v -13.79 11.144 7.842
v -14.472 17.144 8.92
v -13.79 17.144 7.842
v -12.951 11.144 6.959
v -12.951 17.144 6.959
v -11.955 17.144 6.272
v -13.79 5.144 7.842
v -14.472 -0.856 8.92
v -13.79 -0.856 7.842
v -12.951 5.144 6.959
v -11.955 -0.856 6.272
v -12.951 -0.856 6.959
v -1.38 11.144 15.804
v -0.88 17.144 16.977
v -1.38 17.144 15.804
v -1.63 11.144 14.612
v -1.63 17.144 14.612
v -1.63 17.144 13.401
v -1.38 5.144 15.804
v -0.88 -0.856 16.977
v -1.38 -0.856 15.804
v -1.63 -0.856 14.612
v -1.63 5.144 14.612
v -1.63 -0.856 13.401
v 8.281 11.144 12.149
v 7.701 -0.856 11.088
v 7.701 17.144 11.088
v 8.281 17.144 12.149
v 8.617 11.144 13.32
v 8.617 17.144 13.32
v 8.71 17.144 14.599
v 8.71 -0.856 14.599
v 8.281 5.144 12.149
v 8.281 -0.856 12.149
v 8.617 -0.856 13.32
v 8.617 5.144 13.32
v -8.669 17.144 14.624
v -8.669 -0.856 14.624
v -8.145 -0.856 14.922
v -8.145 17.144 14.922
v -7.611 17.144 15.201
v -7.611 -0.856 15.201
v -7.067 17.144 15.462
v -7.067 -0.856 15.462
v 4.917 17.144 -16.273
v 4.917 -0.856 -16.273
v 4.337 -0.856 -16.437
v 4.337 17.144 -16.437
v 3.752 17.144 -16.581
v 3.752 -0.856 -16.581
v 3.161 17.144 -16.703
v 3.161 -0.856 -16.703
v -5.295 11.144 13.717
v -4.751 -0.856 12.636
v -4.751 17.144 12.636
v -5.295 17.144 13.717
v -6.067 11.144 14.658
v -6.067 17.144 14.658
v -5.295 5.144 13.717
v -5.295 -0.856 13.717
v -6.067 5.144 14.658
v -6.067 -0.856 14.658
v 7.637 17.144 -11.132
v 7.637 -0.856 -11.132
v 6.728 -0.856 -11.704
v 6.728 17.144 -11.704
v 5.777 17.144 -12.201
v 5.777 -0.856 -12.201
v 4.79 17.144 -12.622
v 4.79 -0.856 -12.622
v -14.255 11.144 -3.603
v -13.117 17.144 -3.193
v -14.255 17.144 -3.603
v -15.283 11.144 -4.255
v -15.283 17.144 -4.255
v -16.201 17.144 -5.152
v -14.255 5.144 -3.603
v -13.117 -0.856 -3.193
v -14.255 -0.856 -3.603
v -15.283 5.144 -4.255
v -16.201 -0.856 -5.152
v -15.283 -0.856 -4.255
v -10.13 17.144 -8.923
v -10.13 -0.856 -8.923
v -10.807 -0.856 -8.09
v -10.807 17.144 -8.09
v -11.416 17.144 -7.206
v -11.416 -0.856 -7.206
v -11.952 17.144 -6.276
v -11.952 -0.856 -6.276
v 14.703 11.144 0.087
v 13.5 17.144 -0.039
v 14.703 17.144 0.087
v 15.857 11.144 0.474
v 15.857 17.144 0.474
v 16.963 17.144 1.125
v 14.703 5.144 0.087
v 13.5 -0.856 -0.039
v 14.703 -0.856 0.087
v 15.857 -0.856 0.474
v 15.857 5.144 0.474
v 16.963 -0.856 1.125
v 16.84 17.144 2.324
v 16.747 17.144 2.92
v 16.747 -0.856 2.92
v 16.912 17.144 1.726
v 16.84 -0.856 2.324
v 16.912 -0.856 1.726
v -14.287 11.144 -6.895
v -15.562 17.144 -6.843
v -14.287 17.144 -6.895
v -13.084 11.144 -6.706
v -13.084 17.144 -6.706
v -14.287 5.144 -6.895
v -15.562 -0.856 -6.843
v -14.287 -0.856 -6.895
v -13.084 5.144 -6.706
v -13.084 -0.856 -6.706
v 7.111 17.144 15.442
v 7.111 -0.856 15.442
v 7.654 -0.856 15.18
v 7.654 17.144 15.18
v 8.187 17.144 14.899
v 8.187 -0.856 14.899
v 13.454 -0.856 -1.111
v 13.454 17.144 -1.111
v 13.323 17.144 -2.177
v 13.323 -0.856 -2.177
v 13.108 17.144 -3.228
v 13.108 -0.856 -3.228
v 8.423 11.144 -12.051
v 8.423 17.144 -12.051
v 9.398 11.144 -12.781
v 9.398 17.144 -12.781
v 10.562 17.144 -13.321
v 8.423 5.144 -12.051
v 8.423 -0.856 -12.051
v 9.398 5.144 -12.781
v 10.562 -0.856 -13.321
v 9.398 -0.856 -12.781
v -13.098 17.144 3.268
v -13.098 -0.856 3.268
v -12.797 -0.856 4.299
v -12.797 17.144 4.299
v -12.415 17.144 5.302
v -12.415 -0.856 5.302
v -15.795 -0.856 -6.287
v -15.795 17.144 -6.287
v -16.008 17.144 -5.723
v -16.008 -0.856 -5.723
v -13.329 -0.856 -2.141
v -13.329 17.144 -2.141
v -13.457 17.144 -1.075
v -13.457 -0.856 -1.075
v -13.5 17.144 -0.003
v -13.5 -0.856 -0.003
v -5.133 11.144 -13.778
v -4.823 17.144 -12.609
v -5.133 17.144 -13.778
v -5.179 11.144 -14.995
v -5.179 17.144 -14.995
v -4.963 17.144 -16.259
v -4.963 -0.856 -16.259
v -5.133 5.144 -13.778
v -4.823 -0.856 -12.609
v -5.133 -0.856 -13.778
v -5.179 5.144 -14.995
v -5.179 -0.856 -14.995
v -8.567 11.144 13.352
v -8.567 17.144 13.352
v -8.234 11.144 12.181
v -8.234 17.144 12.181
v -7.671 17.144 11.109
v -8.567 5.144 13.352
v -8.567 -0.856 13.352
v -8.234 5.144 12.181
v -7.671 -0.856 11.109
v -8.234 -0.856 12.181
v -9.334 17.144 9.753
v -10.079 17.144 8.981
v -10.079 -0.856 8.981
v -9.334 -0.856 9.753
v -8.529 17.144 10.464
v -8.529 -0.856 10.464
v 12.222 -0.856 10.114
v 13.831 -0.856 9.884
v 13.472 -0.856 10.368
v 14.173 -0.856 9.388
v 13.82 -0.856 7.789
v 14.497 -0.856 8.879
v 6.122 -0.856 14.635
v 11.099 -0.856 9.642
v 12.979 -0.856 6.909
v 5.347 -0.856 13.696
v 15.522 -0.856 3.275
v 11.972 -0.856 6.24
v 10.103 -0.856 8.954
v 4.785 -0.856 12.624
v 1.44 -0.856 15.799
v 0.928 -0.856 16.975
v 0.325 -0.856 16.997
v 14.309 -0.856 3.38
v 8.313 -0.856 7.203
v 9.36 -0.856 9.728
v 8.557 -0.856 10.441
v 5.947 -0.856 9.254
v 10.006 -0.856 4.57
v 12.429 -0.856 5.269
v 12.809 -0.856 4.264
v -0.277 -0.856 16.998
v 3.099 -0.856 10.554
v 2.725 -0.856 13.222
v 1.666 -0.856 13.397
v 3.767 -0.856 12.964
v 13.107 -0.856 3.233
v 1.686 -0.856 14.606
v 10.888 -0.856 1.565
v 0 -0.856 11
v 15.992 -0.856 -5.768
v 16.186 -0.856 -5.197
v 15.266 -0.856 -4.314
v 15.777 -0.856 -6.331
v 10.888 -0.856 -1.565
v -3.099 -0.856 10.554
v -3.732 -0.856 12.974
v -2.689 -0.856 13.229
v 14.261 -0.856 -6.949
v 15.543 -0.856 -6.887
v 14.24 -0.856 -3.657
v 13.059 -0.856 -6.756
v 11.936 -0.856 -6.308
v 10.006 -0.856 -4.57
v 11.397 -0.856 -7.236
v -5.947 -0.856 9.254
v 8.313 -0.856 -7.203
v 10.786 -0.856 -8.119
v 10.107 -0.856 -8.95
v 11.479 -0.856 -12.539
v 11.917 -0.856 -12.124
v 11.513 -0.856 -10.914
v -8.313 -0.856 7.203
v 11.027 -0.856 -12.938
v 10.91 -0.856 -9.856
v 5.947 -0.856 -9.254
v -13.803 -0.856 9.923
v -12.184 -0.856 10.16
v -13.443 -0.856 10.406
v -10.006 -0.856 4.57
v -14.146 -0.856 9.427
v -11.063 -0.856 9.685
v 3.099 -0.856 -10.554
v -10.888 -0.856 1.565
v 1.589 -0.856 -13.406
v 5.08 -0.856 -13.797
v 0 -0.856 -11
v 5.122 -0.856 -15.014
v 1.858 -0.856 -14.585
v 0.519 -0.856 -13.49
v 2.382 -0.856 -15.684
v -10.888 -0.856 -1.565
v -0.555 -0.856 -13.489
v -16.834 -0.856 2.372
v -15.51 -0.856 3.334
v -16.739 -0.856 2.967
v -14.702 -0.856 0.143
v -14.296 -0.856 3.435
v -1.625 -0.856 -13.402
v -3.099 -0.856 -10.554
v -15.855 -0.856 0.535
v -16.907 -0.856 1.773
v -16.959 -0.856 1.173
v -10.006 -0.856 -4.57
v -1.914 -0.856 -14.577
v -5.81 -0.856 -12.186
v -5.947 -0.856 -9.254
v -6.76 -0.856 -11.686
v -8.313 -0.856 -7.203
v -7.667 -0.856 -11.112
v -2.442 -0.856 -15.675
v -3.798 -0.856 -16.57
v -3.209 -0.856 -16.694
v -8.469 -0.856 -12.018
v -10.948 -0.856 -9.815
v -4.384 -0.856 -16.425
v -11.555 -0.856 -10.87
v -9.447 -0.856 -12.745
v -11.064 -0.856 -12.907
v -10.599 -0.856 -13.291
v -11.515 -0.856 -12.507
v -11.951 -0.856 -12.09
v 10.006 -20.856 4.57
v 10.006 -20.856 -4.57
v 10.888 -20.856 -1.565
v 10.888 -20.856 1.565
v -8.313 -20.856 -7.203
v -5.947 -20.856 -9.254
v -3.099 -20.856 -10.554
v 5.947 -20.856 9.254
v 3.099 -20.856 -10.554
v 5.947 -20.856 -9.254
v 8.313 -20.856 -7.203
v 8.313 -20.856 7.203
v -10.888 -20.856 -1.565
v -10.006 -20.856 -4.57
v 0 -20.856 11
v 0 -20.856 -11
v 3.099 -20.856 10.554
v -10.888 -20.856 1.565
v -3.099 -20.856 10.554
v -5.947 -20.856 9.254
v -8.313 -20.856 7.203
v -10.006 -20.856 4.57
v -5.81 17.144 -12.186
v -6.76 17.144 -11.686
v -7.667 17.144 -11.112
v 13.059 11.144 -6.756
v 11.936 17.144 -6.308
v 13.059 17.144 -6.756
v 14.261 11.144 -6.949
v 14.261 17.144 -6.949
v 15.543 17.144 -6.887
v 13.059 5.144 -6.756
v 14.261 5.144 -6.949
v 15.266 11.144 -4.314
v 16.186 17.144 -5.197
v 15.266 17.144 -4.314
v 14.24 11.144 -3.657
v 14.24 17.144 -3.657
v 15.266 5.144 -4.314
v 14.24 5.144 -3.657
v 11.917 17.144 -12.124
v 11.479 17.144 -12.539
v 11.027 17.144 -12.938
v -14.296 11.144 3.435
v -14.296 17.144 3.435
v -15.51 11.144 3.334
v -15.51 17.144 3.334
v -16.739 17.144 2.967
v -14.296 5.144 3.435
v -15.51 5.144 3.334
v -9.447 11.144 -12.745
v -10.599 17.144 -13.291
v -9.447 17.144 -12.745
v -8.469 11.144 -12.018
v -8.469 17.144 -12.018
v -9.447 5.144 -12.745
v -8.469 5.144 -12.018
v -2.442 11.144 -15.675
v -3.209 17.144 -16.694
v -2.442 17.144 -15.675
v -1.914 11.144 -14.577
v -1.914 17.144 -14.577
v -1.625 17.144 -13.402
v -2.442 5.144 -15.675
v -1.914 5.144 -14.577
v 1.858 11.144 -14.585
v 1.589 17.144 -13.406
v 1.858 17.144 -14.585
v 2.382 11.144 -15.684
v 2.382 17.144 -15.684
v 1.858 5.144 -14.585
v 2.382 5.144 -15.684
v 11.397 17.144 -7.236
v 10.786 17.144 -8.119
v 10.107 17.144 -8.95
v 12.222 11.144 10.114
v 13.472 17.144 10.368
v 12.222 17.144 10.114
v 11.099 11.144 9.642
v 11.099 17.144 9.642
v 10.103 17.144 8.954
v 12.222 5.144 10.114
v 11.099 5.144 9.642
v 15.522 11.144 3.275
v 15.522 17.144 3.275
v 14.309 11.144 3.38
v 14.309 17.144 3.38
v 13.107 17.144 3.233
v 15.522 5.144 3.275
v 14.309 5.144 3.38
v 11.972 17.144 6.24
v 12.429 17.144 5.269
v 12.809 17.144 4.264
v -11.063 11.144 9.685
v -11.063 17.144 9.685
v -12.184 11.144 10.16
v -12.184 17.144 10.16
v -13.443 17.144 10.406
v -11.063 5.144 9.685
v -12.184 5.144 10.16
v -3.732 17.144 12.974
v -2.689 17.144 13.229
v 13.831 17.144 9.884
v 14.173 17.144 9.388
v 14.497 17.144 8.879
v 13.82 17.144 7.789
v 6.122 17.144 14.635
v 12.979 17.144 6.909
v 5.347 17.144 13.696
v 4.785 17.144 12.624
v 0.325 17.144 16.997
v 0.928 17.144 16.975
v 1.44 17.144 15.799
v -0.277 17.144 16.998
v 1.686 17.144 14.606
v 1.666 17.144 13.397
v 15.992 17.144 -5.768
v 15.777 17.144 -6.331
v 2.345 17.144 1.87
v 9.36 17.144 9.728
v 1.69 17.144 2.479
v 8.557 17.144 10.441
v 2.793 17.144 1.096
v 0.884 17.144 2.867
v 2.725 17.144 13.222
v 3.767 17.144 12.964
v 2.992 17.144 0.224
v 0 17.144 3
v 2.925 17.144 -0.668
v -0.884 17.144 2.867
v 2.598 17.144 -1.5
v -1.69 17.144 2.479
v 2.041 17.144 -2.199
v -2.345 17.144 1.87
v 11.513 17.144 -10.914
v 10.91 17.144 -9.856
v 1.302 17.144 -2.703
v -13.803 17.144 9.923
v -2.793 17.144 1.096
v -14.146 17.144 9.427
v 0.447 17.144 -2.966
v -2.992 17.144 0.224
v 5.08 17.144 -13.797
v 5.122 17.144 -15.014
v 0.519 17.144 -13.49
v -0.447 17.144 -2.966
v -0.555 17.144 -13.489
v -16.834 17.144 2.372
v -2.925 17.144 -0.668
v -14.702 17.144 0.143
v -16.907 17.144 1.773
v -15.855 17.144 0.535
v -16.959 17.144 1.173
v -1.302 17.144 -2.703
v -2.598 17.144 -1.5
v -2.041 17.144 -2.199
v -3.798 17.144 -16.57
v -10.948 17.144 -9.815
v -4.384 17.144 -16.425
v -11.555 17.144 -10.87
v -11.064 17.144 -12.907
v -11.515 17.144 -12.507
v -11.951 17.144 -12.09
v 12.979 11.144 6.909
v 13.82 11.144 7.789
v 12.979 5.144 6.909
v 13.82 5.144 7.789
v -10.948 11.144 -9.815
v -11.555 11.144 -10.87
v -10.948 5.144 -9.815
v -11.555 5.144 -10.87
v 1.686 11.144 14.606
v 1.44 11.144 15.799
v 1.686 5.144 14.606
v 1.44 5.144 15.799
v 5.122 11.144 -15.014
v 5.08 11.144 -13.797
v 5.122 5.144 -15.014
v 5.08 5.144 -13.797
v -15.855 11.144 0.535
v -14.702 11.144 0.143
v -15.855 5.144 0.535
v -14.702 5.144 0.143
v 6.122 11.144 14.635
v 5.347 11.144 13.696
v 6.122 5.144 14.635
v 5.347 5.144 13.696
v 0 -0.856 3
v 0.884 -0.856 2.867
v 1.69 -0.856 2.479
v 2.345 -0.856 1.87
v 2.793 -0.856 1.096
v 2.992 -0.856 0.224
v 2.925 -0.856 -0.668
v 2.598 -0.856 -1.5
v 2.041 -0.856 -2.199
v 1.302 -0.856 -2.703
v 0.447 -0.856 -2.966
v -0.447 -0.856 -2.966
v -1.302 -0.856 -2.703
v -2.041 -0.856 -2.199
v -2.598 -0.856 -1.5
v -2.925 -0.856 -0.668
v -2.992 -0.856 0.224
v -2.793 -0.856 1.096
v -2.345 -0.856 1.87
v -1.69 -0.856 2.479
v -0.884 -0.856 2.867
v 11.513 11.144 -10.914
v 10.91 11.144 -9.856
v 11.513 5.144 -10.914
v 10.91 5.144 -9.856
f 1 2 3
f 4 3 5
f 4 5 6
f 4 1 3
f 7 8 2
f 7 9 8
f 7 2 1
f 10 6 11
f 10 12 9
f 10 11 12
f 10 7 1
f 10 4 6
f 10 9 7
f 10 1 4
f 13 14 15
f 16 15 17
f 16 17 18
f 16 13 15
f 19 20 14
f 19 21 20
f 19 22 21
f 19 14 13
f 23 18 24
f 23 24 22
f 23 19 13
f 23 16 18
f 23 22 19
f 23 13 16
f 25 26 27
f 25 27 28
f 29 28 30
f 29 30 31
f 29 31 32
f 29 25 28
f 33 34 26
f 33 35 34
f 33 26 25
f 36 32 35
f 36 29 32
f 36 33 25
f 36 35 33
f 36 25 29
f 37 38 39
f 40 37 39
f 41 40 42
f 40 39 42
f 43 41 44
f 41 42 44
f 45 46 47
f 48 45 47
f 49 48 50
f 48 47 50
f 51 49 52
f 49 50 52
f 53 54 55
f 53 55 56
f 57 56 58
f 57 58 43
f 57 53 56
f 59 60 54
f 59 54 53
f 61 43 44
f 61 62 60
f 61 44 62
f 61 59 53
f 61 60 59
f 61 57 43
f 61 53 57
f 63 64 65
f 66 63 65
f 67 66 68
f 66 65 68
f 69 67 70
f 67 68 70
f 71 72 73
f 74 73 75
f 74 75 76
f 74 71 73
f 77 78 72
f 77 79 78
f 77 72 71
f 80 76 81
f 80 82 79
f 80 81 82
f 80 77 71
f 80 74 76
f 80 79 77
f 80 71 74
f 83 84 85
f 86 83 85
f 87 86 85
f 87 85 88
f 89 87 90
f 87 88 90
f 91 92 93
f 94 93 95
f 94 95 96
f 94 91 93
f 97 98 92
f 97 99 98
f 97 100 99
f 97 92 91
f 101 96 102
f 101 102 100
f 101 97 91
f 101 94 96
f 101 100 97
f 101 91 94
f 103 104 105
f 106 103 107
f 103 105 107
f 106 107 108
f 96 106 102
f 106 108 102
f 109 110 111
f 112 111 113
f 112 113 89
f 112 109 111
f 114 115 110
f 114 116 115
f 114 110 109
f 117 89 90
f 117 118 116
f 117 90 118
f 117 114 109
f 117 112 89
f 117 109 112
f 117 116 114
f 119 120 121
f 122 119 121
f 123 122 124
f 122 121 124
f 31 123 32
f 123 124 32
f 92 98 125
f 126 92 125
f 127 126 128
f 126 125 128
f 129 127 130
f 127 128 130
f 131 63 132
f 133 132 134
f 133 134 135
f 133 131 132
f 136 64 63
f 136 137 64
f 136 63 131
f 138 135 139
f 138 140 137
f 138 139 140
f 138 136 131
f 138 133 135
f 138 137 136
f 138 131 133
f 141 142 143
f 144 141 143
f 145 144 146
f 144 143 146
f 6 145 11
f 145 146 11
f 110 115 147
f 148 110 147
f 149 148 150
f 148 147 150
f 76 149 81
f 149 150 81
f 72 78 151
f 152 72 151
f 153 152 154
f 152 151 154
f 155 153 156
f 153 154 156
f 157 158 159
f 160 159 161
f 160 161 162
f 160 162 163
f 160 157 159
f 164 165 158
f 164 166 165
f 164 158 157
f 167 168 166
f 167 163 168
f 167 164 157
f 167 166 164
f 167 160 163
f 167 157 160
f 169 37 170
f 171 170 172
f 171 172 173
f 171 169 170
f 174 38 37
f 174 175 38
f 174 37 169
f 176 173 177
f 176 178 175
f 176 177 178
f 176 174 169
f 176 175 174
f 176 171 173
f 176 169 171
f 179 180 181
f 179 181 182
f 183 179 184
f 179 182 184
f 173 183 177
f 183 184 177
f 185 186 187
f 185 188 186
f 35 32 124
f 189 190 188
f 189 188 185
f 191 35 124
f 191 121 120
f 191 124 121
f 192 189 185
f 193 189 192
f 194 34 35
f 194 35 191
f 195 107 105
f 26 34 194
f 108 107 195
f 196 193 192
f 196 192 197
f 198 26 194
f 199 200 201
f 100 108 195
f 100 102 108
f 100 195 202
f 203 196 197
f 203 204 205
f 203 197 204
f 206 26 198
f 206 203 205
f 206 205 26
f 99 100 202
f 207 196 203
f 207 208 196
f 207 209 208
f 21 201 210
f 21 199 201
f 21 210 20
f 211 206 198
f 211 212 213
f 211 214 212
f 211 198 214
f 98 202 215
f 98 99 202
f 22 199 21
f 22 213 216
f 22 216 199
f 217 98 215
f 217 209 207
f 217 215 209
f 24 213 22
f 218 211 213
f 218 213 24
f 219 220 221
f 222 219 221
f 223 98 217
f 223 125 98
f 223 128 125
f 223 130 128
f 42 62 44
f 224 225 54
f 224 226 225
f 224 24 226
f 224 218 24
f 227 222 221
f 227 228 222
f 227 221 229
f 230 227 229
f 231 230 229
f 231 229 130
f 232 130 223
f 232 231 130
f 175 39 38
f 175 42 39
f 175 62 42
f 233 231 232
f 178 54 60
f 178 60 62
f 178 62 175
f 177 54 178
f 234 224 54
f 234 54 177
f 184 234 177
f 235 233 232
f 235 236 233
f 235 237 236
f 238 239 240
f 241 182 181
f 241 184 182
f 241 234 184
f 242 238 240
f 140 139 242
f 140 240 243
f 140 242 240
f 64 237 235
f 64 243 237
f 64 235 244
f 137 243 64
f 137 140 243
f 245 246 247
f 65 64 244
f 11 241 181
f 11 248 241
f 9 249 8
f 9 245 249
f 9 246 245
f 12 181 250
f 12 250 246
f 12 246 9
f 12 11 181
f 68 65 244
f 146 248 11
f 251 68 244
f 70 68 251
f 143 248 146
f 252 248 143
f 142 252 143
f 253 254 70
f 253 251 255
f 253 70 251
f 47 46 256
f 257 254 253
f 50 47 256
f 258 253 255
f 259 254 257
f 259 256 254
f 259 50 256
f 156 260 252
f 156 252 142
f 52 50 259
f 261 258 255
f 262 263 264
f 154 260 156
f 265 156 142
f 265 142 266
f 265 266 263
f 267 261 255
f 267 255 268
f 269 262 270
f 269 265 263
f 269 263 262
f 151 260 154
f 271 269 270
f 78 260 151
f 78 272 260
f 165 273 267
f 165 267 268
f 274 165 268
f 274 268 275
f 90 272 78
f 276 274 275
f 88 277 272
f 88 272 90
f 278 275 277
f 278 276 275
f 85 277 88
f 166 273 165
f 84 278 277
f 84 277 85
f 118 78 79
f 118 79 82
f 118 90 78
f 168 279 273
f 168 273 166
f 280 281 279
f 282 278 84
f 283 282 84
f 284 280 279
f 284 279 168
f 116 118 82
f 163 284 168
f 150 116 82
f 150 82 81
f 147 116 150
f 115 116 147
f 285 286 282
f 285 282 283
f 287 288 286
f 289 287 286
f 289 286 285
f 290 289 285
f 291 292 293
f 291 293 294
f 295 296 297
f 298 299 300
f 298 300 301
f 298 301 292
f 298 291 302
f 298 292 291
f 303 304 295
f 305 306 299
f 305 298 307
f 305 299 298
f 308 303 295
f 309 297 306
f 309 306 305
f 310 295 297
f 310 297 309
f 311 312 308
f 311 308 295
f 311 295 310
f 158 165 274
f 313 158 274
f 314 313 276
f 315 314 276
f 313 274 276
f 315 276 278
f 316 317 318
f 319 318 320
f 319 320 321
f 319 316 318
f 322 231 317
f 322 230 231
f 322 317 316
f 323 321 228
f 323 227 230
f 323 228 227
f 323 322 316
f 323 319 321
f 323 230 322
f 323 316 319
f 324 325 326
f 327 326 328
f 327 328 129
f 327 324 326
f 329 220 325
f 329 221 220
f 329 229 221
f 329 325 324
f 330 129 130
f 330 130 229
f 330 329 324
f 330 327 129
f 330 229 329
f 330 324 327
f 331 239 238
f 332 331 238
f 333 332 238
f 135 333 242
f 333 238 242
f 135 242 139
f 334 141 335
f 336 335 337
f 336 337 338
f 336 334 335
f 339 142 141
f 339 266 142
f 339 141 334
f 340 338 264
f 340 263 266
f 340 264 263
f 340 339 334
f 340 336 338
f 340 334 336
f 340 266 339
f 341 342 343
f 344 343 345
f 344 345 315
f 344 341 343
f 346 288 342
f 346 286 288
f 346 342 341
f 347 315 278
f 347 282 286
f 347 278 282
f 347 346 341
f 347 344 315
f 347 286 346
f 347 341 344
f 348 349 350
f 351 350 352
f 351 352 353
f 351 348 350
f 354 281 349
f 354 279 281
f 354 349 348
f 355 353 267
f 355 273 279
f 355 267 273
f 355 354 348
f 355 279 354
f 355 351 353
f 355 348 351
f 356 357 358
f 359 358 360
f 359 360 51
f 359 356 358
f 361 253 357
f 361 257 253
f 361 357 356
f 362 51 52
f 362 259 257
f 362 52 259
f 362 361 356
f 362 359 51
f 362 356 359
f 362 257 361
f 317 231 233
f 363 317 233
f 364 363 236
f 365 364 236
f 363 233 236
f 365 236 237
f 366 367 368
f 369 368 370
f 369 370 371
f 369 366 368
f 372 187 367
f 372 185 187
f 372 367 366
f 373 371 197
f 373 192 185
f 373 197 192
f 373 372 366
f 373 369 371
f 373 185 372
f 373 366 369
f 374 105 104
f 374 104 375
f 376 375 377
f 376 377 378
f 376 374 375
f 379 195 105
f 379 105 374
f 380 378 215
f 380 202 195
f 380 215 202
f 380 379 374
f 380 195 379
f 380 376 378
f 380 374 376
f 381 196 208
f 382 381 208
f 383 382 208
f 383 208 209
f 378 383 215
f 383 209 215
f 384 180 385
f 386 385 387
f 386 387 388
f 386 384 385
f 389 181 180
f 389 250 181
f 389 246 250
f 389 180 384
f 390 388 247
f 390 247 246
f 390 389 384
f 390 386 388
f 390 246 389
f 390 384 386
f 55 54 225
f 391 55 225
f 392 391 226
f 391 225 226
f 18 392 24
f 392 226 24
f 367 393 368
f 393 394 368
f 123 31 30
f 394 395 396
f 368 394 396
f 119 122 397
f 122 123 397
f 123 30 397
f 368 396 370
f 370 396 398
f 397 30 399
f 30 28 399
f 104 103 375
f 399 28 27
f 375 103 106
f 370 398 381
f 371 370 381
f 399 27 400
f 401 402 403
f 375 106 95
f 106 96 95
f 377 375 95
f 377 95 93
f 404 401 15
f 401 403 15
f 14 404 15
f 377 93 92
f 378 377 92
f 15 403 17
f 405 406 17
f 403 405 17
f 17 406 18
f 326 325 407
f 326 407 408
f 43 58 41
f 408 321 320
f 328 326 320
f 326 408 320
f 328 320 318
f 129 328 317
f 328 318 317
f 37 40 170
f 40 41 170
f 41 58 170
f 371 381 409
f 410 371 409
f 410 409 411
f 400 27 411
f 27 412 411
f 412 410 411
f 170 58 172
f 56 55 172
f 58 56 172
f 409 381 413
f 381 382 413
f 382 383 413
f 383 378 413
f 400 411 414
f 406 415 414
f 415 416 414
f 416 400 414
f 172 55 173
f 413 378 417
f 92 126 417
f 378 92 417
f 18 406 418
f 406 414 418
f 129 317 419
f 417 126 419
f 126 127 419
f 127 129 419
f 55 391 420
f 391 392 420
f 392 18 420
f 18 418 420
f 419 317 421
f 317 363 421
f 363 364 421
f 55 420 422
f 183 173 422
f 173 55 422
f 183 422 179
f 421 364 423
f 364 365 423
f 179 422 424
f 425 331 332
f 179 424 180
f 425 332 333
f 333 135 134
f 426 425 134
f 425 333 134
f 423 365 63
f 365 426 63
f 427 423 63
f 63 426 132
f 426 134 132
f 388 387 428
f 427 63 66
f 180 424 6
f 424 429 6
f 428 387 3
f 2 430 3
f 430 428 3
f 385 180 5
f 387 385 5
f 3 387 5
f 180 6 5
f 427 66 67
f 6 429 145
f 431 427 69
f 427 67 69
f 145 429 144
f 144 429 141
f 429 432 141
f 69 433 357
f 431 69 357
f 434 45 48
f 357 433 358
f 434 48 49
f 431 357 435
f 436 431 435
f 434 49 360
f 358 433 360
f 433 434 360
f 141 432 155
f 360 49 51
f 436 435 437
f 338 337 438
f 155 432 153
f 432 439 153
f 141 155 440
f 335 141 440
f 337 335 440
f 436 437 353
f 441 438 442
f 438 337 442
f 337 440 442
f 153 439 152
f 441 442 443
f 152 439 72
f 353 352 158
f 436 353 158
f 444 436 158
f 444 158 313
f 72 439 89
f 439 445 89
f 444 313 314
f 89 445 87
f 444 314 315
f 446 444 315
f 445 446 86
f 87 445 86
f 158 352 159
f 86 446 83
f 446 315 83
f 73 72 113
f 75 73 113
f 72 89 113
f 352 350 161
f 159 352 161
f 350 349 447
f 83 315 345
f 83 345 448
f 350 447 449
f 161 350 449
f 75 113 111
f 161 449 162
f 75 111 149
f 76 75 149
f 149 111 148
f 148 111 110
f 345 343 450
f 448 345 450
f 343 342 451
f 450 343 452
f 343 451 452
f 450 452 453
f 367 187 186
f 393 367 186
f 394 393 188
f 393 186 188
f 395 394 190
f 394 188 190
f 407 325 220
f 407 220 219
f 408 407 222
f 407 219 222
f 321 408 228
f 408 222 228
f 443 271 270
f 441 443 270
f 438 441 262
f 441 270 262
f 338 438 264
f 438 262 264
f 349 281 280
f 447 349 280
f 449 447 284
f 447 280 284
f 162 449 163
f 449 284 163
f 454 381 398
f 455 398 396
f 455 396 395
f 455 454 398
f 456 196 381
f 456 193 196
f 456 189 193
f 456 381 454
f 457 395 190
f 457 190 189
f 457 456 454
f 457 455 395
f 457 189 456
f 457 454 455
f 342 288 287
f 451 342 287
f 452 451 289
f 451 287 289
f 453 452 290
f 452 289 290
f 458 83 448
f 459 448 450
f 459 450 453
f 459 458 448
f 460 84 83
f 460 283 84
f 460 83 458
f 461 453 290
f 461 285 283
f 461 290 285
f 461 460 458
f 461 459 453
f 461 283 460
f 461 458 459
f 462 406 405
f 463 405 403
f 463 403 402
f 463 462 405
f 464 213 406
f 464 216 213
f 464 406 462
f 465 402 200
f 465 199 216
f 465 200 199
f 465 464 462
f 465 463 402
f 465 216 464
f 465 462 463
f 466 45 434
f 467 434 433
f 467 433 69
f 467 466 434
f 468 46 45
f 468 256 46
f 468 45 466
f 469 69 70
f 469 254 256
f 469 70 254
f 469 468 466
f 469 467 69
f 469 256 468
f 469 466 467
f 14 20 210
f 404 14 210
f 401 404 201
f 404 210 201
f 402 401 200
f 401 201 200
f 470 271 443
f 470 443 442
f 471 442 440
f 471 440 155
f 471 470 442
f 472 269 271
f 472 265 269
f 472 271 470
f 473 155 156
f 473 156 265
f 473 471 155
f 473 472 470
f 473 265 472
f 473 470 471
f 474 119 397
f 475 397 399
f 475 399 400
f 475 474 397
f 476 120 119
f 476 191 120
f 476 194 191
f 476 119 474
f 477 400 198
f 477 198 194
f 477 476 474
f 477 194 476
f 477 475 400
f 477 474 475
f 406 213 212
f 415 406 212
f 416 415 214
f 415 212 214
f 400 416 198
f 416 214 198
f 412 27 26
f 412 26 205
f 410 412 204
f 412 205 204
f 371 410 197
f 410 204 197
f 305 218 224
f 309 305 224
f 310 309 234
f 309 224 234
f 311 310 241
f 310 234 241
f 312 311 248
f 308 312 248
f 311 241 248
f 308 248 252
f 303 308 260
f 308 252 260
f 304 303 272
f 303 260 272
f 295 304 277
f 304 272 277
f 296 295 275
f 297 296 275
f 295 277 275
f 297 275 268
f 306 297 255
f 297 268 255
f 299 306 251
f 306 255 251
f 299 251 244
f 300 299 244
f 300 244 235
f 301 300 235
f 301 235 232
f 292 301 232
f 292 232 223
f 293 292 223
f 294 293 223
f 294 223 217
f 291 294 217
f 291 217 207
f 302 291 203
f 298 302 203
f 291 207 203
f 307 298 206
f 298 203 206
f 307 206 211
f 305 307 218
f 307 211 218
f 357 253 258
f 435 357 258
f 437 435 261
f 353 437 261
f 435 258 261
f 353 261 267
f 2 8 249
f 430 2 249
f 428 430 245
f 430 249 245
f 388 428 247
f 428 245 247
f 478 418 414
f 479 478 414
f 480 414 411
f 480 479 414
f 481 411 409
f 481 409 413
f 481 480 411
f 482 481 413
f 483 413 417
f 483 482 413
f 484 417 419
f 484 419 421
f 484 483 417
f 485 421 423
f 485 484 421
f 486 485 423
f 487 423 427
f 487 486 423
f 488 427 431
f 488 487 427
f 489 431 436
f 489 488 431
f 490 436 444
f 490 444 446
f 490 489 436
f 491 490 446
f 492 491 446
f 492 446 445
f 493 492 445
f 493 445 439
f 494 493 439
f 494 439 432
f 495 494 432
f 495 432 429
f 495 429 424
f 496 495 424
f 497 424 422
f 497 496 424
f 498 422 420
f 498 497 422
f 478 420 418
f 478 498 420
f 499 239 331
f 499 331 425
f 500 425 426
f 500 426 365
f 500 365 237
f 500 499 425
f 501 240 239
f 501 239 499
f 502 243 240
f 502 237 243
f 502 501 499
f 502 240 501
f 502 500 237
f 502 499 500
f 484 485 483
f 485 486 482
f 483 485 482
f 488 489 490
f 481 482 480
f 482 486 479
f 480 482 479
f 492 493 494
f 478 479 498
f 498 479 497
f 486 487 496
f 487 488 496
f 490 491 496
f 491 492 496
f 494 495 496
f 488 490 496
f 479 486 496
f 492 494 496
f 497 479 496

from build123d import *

# Parameters (mm, degrees)
SKETCH1_R           = 1.5
BOSS_EXTRUDE1_DEPTH = 9
SKETCH2_R           = 5.5
BOSS_EXTRUDE2_DEPTH = 10
L_EK2_SCALE         = 2


with BuildPart() as part:
    # Sketch1 → Boss-Extrude1 (new body)
    with BuildSketch(Plane(origin=(0, 0, 0), x_dir=(1, 0, 0), z_dir=(0, 1, 0))):
        with BuildLine():
            add(Edge.make_bspline(
                [(-5.065227978, 4.461610195), (-5.526615005, 4.86619147), (-5.830003112, 5.39406146), (-5.975392301, 6.045220165)],
                knots=[0, 0, 0, 0, 0.872429449, 0.872429449, 0.872429449, 0.872429449], degree=3))
            ThreePointArc((-5.065227978, 4.461610195), (-5.560258819, 3.827012132), (-5.976238464, 3.138004752))
            add(Edge.make_bspline(
                [(-7.780961116, 3.42149735), (-7.125870497, 3.507536778), (-6.52429628, 3.413039245), (-5.976238464, 3.138004752)],
                knots=[0.127683247, 0.127683247, 0.127683247, 0.127683247, 1, 1, 1, 1], degree=3))
            ThreePointArc((-7.780961116, 3.42149735), (-7.951879756, 3.00293329), (-8.10030101, 2.575873357))
            add(Edge.make_bspline(
                [(-6.558450277, 1.596630818), (-7.155006493, 1.740452504), (-7.668956737, 2.066866683), (-8.10030101, 2.575873357)],
                knots=[0, 0, 0, 0, 0.872429449, 0.872429449, 0.872429449, 0.872429449], degree=3))
            ThreePointArc((-6.558450277, 1.596630818), (-6.701865893, 0.804669837), (-6.749999881, 0.00126872))
            add(Edge.make_bspline(
                [(-8.479748007, -0.586407486), (-7.939678588, -0.205787566), (-7.363095879, -0.009895497), (-6.749999881, 0.00126872)],
                knots=[0.127683247, 0.127683247, 0.127683247, 0.127683247, 1, 1, 1, 1], degree=3))
            ThreePointArc((-8.479748007, -0.586407486), (-8.436572529, -1.036457408), (-8.369528376, -1.483574994))
            add(Edge.make_bspline(
                [(-6.549210655, -1.634117437), (-7.144272221, -1.784003157), (-7.751044795, -1.733822342), (-8.369528376, -1.483574994)],
                knots=[0, 0, 0, 0, 0.872429449, 0.872429449, 0.872429449, 0.872429449], degree=3))
            ThreePointArc((-6.549210655, -1.634117437), (-6.308156258, -2.402012621), (-5.977417671, -3.13575796))
            add(Edge.make_bspline(
                [(-7.235926822, -4.459973434), (-6.934601997, -3.871968458), (-6.515098947, -3.4305633), (-5.977417671, -3.13575796)],
                knots=[0.127683247, 0.127683247, 0.127683247, 0.127683247, 1, 1, 1, 1], degree=3))
            ThreePointArc((-7.235926822, -4.459973434), (-6.988548208, -4.838408204), (-6.721397655, -5.203154193))
            add(Edge.make_bspline(
                [(-5.039625799, -4.490509081), (-5.496871281, -4.899765193), (-6.0574619, -5.137313564), (-6.721397655, -5.203154193)],
                knots=[0, 0, 0, 0, 0.872429449, 0.872429449, 0.872429449, 0.872429449], degree=3))
            ThreePointArc((-5.039625799, -4.490509081), (-4.469324045, -5.058422935), (-3.835481109, -5.554420281))
            add(Edge.make_bspline(
                [(-4.334442004, -7.311813216), (-4.34089166, -6.651128039), (-4.174571361, -6.065330394), (-3.835481109, -5.554420281)],
                knots=[0.127683247, 0.127683247, 0.127683247, 0.127683247, 1, 1, 1, 1], degree=3))
            ThreePointArc((-4.334442004, -7.311813216), (-3.939531713, -7.53193799), (-3.533475733, -7.730753472))
            add(Edge.make_bspline(
                [(-2.375523406, -6.318179211), (-2.590203375, -6.893050073), (-2.976187484, -7.36390816), (-3.533475733, -7.730753472)],
                knots=[0, 0, 0, 0, 0.872429449, 0.872429449, 0.872429449, 0.872429449], degree=3))
            ThreePointArc((-2.375523406, -6.318179211), (-1.606623554, -6.556009515), (-0.814882047, -6.700631854))
            add(Edge.make_bspline(
                [(-0.439988759, -8.488604708), (-0.752735357, -7.906594341), (-0.877699786, -7.31060339), (-0.814882047, -6.700631854)],
                knots=[0.127683247, 0.127683247, 0.127683247, 0.127683247, 1, 1, 1, 1], degree=3))
            ThreePointArc((-0.439988759, -8.488604708), (0.011984021, -8.499991552), (0.463922896, -8.487330296))
            add(Edge.make_bspline(
                [(0.832782771, -6.698430626), (0.909848909, -7.307220251), (0.786895617, -7.903520141), (0.463922896, -8.487330296)],
                knots=[0, 0, 0, 0, 0.872429449, 0.872429449, 0.872429449, 0.872429449], degree=3))
            ThreePointArc((0.832782771, -6.698430626), (1.624135031, -6.551693323), (2.392396671, -6.311809421))
            add(Edge.make_bspline(
                [(3.555260608, -7.72075916), (3.007863545, -7.350755165), (2.620242233, -6.881105252), (2.392396671, -6.311809421)],
                knots=[0.127683247, 0.127683247, 0.127683247, 0.127683247, 1, 1, 1, 1], degree=3))
            ThreePointArc((3.555260608, -7.72075916), (3.96075436, -7.520799485), (4.355042381, -7.299562032))
            add(Edge.make_bspline(
                [(3.850308451, -5.54415231), (4.201465773, -6.047394331), (4.369710416, -6.632530905), (4.355042381, -7.299562032)],
                knots=[0, 0, 0, 0, 0.872429449, 0.872429449, 0.872429449, 0.872429449], degree=3))
            ThreePointArc((3.850308451, -5.54415231), (4.482823853, -5.046463148), (5.051606144, -4.477027515))
            add(Edge.make_bspline(
                [(6.736042616, -5.184180734), (6.079397157, -5.110946566), (5.517918333, -4.875228826), (5.051606144, -4.477027515)],
                knots=[0.127683247, 0.127683247, 0.127683247, 0.127683247, 1, 1, 1, 1], degree=3))
            ThreePointArc((6.736042616, -5.184180734), (7.002163607, -4.818682892), (7.24847414, -4.439552076))
            add(Edge.make_bspline(
                [(5.985774866, -3.119775513), (6.530577461, -3.402183249), (6.951477219, -3.84210877), (7.24847414, -4.439552076)],
                knots=[0, 0, 0, 0, 0.872429449, 0.872429449, 0.872429449, 0.872429449], degree=3))
            ThreePointArc((5.985774866, -3.119775513), (6.314551754, -2.385149082), (6.553553527, -1.616612559))
            add(Edge.make_bspline(
                [(8.373678438, -1.459968977), (7.758214146, -1.700281702), (7.151505842, -1.75249623), (6.553553527, -1.616612559)],
                knots=[0.127683247, 0.127683247, 0.127683247, 0.127683247, 1, 1, 1, 1], degree=3))
            ThreePointArc((8.373678438, -1.459968977), (8.439461558, -1.01266412), (8.481367828, -0.562494242))
            add(Edge.make_bspline(
                [(6.749972396, 0.019304256), (7.363612555, 0.022427015), (7.940744366, -0.171505818), (8.481367828, -0.562494242)],
                knots=[0, 0, 0, 0, 0.872429449, 0.872429449, 0.872429449, 0.872429449], degree=3))
            ThreePointArc((6.749972396, 0.019304256), (6.699691947, 0.822573894), (6.554160776, 1.614148852))
            add(Edge.make_bspline(
                [(8.093005444, 2.598704077), (7.65971777, 2.099897208), (7.146769547, 1.771712133), (6.554160776, 1.614148852)],
                knots=[0.127683247, 0.127683247, 0.127683247, 0.127683247, 1, 1, 1, 1], degree=3))
            ThreePointArc((8.093005444, 2.598704077), (7.943380571, 3.025343799), (7.771282357, 3.443424244))
            add(Edge.make_bspline(
                [(5.967832596, 3.153961653), (6.509732754, 3.44189952), (7.110882674, 3.53838705), (7.771282357, 3.443424244)],
                knots=[0, 0, 0, 0, 0.872429449, 0.872429449, 0.872429449, 0.872429449], degree=3))
            ThreePointArc((5.967832596, 3.153961653), (5.550013455, 3.841855105), (5.053288778, 4.475128213))
            add(Edge.make_bspline(
                [(5.958322434, 6.062045345), (5.806472362, 5.419014975), (5.504794477, 4.890042598), (5.053288778, 4.475128213)],
                knots=[0.127683247, 0.127683247, 0.127683247, 0.127683247, 1, 1, 1, 1], degree=3))
            ThreePointArc((5.958322434, 6.062045345), (5.627566824, 6.370281912), (5.280889753, 6.660495734))
            add(Edge.make_bspline(
                [(3.818534268, 5.566084444), (4.16455163, 6.072874324), (4.652003458, 6.437678087), (5.280889753, 6.660495734)],
                knots=[0, 0, 0, 0, 0.872429449, 0.872429449, 0.872429449, 0.872429449], degree=3))
            ThreePointArc((3.818534268, 5.566084444), (3.128893766, 5.98101361), (2.394769219, 6.310909632))
            add(Edge.make_bspline(
                [(2.45865956, 8.136645081), (2.623034112, 7.496701718), (2.601737332, 6.888123235), (2.394769219, 6.310909632)],
                knots=[0.127683247, 0.127683247, 0.127683247, 0.127683247, 1, 1, 1, 1], degree=3))
            ThreePointArc((2.45865956, 8.136645081), (2.022545337, 8.25586521), (1.580708948, 8.351727918))
            add(Edge.make_bspline(
                [(0.794455758, 6.703084368), (0.865321915, 7.312626807), (1.127406312, 7.862174657), (1.580708948, 8.351727918)],
                knots=[0, 0, 0, 0, 0.872429449, 0.872429449, 0.872429449, 0.872429449], degree=3))
            ThreePointArc((0.794455758, 6.703084368), (-0.009017778, 6.749993976), (-0.812363108, 6.700937709))
            add(Edge.make_bspline(
                [(-1.604252589, 8.347237485), (-1.161309642, 7.856984441), (-0.897346481, 7.308217849), (-0.812363108, 6.700937709)],
                knots=[0.127683247, 0.127683247, 0.127683247, 0.127683247, 1, 1, 1, 1], degree=3))
            ThreePointArc((-1.604252589, 8.347237485), (-2.045816912, 8.250129282), (-2.481593228, 8.129679886))
            add(Edge.make_bspline(
                [(-2.411622992, 6.304488444), (-2.632142622, 6.877144615), (-2.655466033, 7.485541762), (-2.481593228, 8.129679886)],
                knots=[0, 0, 0, 0, 0.872429449, 0.872429449, 0.872429449, 0.872429449], degree=3))
            ThreePointArc((-2.411622992, 6.304488444), (-3.144863458, 5.972632069), (-3.833392837, 5.555861712))
            add(Edge.make_bspline(
                [(-5.299649804, 6.645578377), (-4.679611352, 6.417326717), (-4.19085903, 6.054087828), (-3.833392837, 5.555861712)],
                knots=[0.127683247, 0.127683247, 0.127683247, 0.127683247, 1, 1, 1, 1], degree=3))
            ThreePointArc((-5.299649804, 6.645578377), (-5.645507162, 6.35438816), (-5.975392301, 6.045220165))
        make_face()
        with Locations(Location((0, 0, 0), (0, 0, 270))):
            Circle(SKETCH1_R, mode=Mode.SUBTRACT)
    extrude(amount=BOSS_EXTRUDE1_DEPTH)

    # Sketch2 → Boss-Extrude2 (add)
    with BuildSketch(Plane.XZ):
        with Locations(Location((0, 0, 0), (0, 0, 90))):
            Circle(SKETCH2_R)
    extrude(amount=BOSS_EXTRUDE2_DEPTH)


with BuildPart() as part_1:
    # Ölçek2: scaled about (0, 0.855834843, 0)
    add(part.part.scale(L_EK2_SCALE).moved(Location((0, -0.855834843, 0))))


solid = part_1.part
